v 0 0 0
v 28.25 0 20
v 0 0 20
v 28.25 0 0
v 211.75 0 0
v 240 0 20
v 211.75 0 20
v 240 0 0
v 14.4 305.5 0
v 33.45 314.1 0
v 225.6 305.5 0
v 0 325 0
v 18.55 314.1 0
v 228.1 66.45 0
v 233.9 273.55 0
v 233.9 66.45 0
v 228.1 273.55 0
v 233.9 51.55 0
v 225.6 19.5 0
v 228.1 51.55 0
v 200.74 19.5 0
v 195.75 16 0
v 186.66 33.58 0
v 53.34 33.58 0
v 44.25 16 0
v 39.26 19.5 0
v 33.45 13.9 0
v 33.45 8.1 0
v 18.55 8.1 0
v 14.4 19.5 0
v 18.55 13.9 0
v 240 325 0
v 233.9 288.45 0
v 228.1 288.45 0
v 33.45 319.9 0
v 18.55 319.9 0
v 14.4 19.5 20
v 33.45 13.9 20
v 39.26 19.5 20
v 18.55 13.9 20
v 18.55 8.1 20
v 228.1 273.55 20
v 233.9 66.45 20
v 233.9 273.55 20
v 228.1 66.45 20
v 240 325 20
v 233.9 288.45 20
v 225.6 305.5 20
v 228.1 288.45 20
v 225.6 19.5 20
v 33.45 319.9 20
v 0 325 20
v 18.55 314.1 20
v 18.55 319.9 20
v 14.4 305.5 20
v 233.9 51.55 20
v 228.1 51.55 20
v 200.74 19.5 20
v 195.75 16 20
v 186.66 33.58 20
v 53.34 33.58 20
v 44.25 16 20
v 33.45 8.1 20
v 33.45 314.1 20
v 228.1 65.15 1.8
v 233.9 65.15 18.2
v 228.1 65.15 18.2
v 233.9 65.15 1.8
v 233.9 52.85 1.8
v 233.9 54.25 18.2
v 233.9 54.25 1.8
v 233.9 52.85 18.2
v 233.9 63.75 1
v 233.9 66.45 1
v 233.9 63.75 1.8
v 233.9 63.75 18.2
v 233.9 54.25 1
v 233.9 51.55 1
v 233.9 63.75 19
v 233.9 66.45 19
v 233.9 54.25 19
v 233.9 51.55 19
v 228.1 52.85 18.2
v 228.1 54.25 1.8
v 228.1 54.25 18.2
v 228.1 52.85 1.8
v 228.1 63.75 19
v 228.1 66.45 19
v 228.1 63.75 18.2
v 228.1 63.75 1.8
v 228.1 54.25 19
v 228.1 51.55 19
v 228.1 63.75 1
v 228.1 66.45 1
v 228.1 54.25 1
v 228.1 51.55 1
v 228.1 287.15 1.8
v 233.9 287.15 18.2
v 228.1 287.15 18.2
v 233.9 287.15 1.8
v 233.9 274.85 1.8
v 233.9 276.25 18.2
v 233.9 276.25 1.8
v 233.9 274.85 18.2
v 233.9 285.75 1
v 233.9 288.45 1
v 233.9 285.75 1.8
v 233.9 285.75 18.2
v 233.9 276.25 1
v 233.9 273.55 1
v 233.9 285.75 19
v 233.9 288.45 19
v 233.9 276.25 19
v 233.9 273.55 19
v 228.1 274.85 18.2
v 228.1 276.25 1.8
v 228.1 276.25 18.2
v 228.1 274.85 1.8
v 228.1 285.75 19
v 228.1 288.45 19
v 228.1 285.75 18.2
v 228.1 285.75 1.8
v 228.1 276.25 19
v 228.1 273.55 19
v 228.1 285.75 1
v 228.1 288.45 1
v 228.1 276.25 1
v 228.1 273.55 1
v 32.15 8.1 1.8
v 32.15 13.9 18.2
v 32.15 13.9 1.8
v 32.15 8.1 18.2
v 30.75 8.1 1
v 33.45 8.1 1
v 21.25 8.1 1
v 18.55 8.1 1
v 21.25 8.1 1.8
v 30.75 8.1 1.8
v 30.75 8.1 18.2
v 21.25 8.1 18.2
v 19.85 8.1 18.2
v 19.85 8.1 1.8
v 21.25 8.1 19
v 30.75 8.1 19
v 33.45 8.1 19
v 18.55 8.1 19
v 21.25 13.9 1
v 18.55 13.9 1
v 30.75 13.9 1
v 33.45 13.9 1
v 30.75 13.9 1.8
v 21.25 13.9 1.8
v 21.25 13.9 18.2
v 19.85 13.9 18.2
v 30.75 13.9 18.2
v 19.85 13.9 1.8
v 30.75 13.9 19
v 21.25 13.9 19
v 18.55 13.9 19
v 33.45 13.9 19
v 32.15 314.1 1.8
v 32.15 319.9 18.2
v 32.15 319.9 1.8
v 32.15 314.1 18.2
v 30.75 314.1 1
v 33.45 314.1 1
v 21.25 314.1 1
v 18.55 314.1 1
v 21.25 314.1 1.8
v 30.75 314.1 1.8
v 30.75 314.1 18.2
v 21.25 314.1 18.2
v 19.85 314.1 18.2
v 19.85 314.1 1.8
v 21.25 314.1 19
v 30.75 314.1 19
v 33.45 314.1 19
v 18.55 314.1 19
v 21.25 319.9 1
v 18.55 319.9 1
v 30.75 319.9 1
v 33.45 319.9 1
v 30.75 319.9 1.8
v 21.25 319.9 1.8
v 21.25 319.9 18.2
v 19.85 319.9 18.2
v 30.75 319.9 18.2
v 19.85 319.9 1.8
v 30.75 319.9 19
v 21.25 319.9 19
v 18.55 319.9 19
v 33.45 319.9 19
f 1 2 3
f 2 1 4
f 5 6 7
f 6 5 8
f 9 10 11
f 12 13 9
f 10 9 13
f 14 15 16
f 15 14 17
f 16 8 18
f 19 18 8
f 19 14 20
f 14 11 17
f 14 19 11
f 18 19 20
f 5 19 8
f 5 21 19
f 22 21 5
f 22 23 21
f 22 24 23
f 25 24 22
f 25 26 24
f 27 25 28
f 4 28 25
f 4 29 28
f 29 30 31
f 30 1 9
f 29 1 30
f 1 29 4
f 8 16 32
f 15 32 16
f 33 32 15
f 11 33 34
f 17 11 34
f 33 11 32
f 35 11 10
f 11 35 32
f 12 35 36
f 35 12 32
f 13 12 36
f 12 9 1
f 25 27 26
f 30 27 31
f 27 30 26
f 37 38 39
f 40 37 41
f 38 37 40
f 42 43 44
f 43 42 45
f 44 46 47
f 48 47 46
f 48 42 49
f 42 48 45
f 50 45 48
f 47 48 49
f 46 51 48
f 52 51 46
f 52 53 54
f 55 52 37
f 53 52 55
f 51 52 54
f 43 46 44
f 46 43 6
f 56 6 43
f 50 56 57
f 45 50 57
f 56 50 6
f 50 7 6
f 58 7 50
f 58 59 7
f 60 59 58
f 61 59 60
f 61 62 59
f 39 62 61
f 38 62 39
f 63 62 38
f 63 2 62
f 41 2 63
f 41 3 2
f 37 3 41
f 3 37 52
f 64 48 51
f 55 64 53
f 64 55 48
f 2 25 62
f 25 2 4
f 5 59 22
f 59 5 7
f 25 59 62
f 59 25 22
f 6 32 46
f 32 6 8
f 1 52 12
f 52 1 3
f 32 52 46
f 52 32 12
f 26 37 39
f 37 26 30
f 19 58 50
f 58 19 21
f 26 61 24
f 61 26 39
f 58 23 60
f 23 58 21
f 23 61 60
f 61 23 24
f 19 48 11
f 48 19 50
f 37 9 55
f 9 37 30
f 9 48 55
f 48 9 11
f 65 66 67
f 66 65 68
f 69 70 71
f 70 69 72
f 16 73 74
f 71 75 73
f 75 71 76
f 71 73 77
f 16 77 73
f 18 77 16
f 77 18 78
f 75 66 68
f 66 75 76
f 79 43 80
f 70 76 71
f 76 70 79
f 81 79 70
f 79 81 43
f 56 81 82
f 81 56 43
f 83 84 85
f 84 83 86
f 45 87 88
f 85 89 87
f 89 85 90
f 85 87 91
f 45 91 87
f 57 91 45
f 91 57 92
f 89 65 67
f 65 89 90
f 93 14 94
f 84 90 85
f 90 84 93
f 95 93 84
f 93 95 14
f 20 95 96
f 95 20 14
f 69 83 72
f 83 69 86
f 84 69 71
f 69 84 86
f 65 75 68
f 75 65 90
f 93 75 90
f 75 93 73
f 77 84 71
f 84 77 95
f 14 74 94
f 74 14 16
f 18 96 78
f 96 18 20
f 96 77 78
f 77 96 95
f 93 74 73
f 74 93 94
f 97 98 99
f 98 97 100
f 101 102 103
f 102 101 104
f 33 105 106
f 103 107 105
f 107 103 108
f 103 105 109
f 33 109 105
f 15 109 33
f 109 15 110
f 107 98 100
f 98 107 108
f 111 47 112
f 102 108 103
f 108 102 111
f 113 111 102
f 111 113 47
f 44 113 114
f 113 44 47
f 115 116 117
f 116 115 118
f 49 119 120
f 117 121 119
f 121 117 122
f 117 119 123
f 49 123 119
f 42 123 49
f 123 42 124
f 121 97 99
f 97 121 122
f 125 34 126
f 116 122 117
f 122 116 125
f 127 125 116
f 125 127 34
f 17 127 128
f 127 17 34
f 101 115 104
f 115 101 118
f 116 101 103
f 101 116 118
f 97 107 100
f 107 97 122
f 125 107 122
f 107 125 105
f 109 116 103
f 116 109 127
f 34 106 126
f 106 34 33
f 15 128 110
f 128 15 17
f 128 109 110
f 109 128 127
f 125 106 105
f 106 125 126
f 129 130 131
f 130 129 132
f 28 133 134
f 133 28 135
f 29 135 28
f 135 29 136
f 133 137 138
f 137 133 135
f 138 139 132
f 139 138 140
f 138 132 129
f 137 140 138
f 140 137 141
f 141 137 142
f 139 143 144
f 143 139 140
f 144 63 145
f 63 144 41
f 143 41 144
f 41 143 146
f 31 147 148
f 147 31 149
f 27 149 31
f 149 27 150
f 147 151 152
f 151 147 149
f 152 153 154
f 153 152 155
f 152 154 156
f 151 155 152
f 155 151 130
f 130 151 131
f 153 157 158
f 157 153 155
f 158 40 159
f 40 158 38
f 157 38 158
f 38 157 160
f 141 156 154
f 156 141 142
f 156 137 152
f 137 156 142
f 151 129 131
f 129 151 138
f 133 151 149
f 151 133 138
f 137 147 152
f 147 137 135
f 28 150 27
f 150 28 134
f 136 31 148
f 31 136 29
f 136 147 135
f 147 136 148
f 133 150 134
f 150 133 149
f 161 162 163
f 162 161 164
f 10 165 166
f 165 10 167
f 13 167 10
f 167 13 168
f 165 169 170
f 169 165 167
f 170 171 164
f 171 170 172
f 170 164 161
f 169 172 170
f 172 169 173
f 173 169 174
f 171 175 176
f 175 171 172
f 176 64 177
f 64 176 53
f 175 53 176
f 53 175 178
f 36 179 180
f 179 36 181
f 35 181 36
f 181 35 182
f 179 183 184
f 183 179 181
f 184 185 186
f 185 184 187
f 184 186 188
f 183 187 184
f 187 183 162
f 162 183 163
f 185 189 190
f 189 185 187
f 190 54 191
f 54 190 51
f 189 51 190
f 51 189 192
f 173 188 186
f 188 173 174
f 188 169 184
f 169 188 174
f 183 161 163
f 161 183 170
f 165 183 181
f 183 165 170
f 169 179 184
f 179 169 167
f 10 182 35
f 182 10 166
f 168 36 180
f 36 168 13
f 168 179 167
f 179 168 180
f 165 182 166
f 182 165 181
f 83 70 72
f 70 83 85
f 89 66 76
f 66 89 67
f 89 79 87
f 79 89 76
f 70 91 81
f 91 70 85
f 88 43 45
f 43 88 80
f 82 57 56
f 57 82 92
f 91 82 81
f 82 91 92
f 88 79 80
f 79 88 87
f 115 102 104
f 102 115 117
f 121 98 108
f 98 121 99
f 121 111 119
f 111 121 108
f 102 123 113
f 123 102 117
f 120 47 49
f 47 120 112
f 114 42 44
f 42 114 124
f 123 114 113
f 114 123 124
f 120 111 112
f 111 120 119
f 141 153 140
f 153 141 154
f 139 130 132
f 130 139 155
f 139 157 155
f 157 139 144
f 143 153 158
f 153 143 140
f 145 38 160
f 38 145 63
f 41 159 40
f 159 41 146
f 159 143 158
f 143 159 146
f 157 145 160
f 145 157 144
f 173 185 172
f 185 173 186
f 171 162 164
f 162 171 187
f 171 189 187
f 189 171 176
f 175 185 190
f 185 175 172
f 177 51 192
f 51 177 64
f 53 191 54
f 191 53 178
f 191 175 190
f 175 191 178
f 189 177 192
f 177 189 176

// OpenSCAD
// length of the extension in cm; at least 2 cm (~0.8 inches)
length = 2;
// change if click-mechanism does not fit or is too loose
socket_height = 5.8;
// detail
$fn = 50;
// don't change, 240 is default value
width = 240;
// don't change, 325 is default value
height = 325;
// distance of the top right socket from outer edge
top_right_distance = 59;
// distance of the top left socket from outer edge
top_left_distance = 44;
// distance of the bottom right socket from outer edge
bottom_right_distance = 11;
// distance of the bottom left socket from outer edge
bottom_left_distance = 8;

whole_model(length*10);

module whole_model(length) {
    difference() {
        panel(length);
        scale_size = 0.88;
        distance_modifier = (1-scale_size)/2;
        translate([width*distance_modifier,height*distance_modifier,0]) {
            scale([scale_size,scale_size,1]) {
                panel(length);
            }
        }
        sockets();
        translate([0,0,length]) {
            mirror([0,0,90]) {
                sockets();
            }
        }
    }
    
}

module panel(length) {
    difference() {
        cube([width,height,length]);
        side_panel_length = 183.5;
        translate([-(side_panel_length-width)/2,0,0]) {
            side_panel(side_panel_length, 16, length);
        }
    }
}

module sockets() {
    // top
    translate([width-9,0,0]) {
        translate([0,top_right_distance,0]) {
            rotate([0,0,90]) {
                click_socket();
            }
        }
        translate([0,height-top_left_distance,0]) {
            rotate([0,0,90]) {
                click_socket();
            }
        }
    }
    // bottom
    translate([26,0,0]) {
        translate([0,bottom_right_distance,0]) {
            click_socket();
        }
        translate([0,height-bottom_left_distance,0]) {
            click_socket();
        }
    }
}

module side_panel(carving_length, depth, thickness){
    translate([0,depth,thickness]) {
        rotate([90,90,0]) {
            triangle_length = depth;
            translate([0,triangle_length,0]) {
                cube_length = carving_length - triangle_length * 2;
                rotate([90,-90,90]) {
                    rectangular_triangle(triangle_length, thickness);
                }
                cube([thickness,cube_length,depth]);
                translate([0,cube_length + triangle_length,triangle_length]) {
                    rotate([90,180,90]) {
                        rectangular_triangle(triangle_length, thickness);
                    }
                }
            }
        }
    }
}

module rectangular_triangle(length, thickness) {
    difference() {
        cube([length, length, thickness]);
        rotate([0,0,45]) {
            cube([length*2, length, thickness]);
        }
    }
}

module click_socket() {
    depth = 15;
    holding_plate = 14.9;
    holder_thickness = 0.8;
    inner_chamber = 12.3;
    inlay = 1;
    hook_depth = 1.4;
    rotate([90,0,0]){
        translate([-holding_plate / 2, 0, -socket_height/2]){
            translate([holding_plate/2 - inner_chamber/2,holder_thickness + inlay,0]) {
                cube([inner_chamber,depth,socket_height]);
            }
            inside_width = inner_chamber - hook_depth * 2;
            translate([(holding_plate - inside_width) / 2,0,0]) {
                cube([inside_width, inlay + holder_thickness,socket_height]);
            }
            cube([holding_plate,inlay,socket_height]);
        }
    }
}
